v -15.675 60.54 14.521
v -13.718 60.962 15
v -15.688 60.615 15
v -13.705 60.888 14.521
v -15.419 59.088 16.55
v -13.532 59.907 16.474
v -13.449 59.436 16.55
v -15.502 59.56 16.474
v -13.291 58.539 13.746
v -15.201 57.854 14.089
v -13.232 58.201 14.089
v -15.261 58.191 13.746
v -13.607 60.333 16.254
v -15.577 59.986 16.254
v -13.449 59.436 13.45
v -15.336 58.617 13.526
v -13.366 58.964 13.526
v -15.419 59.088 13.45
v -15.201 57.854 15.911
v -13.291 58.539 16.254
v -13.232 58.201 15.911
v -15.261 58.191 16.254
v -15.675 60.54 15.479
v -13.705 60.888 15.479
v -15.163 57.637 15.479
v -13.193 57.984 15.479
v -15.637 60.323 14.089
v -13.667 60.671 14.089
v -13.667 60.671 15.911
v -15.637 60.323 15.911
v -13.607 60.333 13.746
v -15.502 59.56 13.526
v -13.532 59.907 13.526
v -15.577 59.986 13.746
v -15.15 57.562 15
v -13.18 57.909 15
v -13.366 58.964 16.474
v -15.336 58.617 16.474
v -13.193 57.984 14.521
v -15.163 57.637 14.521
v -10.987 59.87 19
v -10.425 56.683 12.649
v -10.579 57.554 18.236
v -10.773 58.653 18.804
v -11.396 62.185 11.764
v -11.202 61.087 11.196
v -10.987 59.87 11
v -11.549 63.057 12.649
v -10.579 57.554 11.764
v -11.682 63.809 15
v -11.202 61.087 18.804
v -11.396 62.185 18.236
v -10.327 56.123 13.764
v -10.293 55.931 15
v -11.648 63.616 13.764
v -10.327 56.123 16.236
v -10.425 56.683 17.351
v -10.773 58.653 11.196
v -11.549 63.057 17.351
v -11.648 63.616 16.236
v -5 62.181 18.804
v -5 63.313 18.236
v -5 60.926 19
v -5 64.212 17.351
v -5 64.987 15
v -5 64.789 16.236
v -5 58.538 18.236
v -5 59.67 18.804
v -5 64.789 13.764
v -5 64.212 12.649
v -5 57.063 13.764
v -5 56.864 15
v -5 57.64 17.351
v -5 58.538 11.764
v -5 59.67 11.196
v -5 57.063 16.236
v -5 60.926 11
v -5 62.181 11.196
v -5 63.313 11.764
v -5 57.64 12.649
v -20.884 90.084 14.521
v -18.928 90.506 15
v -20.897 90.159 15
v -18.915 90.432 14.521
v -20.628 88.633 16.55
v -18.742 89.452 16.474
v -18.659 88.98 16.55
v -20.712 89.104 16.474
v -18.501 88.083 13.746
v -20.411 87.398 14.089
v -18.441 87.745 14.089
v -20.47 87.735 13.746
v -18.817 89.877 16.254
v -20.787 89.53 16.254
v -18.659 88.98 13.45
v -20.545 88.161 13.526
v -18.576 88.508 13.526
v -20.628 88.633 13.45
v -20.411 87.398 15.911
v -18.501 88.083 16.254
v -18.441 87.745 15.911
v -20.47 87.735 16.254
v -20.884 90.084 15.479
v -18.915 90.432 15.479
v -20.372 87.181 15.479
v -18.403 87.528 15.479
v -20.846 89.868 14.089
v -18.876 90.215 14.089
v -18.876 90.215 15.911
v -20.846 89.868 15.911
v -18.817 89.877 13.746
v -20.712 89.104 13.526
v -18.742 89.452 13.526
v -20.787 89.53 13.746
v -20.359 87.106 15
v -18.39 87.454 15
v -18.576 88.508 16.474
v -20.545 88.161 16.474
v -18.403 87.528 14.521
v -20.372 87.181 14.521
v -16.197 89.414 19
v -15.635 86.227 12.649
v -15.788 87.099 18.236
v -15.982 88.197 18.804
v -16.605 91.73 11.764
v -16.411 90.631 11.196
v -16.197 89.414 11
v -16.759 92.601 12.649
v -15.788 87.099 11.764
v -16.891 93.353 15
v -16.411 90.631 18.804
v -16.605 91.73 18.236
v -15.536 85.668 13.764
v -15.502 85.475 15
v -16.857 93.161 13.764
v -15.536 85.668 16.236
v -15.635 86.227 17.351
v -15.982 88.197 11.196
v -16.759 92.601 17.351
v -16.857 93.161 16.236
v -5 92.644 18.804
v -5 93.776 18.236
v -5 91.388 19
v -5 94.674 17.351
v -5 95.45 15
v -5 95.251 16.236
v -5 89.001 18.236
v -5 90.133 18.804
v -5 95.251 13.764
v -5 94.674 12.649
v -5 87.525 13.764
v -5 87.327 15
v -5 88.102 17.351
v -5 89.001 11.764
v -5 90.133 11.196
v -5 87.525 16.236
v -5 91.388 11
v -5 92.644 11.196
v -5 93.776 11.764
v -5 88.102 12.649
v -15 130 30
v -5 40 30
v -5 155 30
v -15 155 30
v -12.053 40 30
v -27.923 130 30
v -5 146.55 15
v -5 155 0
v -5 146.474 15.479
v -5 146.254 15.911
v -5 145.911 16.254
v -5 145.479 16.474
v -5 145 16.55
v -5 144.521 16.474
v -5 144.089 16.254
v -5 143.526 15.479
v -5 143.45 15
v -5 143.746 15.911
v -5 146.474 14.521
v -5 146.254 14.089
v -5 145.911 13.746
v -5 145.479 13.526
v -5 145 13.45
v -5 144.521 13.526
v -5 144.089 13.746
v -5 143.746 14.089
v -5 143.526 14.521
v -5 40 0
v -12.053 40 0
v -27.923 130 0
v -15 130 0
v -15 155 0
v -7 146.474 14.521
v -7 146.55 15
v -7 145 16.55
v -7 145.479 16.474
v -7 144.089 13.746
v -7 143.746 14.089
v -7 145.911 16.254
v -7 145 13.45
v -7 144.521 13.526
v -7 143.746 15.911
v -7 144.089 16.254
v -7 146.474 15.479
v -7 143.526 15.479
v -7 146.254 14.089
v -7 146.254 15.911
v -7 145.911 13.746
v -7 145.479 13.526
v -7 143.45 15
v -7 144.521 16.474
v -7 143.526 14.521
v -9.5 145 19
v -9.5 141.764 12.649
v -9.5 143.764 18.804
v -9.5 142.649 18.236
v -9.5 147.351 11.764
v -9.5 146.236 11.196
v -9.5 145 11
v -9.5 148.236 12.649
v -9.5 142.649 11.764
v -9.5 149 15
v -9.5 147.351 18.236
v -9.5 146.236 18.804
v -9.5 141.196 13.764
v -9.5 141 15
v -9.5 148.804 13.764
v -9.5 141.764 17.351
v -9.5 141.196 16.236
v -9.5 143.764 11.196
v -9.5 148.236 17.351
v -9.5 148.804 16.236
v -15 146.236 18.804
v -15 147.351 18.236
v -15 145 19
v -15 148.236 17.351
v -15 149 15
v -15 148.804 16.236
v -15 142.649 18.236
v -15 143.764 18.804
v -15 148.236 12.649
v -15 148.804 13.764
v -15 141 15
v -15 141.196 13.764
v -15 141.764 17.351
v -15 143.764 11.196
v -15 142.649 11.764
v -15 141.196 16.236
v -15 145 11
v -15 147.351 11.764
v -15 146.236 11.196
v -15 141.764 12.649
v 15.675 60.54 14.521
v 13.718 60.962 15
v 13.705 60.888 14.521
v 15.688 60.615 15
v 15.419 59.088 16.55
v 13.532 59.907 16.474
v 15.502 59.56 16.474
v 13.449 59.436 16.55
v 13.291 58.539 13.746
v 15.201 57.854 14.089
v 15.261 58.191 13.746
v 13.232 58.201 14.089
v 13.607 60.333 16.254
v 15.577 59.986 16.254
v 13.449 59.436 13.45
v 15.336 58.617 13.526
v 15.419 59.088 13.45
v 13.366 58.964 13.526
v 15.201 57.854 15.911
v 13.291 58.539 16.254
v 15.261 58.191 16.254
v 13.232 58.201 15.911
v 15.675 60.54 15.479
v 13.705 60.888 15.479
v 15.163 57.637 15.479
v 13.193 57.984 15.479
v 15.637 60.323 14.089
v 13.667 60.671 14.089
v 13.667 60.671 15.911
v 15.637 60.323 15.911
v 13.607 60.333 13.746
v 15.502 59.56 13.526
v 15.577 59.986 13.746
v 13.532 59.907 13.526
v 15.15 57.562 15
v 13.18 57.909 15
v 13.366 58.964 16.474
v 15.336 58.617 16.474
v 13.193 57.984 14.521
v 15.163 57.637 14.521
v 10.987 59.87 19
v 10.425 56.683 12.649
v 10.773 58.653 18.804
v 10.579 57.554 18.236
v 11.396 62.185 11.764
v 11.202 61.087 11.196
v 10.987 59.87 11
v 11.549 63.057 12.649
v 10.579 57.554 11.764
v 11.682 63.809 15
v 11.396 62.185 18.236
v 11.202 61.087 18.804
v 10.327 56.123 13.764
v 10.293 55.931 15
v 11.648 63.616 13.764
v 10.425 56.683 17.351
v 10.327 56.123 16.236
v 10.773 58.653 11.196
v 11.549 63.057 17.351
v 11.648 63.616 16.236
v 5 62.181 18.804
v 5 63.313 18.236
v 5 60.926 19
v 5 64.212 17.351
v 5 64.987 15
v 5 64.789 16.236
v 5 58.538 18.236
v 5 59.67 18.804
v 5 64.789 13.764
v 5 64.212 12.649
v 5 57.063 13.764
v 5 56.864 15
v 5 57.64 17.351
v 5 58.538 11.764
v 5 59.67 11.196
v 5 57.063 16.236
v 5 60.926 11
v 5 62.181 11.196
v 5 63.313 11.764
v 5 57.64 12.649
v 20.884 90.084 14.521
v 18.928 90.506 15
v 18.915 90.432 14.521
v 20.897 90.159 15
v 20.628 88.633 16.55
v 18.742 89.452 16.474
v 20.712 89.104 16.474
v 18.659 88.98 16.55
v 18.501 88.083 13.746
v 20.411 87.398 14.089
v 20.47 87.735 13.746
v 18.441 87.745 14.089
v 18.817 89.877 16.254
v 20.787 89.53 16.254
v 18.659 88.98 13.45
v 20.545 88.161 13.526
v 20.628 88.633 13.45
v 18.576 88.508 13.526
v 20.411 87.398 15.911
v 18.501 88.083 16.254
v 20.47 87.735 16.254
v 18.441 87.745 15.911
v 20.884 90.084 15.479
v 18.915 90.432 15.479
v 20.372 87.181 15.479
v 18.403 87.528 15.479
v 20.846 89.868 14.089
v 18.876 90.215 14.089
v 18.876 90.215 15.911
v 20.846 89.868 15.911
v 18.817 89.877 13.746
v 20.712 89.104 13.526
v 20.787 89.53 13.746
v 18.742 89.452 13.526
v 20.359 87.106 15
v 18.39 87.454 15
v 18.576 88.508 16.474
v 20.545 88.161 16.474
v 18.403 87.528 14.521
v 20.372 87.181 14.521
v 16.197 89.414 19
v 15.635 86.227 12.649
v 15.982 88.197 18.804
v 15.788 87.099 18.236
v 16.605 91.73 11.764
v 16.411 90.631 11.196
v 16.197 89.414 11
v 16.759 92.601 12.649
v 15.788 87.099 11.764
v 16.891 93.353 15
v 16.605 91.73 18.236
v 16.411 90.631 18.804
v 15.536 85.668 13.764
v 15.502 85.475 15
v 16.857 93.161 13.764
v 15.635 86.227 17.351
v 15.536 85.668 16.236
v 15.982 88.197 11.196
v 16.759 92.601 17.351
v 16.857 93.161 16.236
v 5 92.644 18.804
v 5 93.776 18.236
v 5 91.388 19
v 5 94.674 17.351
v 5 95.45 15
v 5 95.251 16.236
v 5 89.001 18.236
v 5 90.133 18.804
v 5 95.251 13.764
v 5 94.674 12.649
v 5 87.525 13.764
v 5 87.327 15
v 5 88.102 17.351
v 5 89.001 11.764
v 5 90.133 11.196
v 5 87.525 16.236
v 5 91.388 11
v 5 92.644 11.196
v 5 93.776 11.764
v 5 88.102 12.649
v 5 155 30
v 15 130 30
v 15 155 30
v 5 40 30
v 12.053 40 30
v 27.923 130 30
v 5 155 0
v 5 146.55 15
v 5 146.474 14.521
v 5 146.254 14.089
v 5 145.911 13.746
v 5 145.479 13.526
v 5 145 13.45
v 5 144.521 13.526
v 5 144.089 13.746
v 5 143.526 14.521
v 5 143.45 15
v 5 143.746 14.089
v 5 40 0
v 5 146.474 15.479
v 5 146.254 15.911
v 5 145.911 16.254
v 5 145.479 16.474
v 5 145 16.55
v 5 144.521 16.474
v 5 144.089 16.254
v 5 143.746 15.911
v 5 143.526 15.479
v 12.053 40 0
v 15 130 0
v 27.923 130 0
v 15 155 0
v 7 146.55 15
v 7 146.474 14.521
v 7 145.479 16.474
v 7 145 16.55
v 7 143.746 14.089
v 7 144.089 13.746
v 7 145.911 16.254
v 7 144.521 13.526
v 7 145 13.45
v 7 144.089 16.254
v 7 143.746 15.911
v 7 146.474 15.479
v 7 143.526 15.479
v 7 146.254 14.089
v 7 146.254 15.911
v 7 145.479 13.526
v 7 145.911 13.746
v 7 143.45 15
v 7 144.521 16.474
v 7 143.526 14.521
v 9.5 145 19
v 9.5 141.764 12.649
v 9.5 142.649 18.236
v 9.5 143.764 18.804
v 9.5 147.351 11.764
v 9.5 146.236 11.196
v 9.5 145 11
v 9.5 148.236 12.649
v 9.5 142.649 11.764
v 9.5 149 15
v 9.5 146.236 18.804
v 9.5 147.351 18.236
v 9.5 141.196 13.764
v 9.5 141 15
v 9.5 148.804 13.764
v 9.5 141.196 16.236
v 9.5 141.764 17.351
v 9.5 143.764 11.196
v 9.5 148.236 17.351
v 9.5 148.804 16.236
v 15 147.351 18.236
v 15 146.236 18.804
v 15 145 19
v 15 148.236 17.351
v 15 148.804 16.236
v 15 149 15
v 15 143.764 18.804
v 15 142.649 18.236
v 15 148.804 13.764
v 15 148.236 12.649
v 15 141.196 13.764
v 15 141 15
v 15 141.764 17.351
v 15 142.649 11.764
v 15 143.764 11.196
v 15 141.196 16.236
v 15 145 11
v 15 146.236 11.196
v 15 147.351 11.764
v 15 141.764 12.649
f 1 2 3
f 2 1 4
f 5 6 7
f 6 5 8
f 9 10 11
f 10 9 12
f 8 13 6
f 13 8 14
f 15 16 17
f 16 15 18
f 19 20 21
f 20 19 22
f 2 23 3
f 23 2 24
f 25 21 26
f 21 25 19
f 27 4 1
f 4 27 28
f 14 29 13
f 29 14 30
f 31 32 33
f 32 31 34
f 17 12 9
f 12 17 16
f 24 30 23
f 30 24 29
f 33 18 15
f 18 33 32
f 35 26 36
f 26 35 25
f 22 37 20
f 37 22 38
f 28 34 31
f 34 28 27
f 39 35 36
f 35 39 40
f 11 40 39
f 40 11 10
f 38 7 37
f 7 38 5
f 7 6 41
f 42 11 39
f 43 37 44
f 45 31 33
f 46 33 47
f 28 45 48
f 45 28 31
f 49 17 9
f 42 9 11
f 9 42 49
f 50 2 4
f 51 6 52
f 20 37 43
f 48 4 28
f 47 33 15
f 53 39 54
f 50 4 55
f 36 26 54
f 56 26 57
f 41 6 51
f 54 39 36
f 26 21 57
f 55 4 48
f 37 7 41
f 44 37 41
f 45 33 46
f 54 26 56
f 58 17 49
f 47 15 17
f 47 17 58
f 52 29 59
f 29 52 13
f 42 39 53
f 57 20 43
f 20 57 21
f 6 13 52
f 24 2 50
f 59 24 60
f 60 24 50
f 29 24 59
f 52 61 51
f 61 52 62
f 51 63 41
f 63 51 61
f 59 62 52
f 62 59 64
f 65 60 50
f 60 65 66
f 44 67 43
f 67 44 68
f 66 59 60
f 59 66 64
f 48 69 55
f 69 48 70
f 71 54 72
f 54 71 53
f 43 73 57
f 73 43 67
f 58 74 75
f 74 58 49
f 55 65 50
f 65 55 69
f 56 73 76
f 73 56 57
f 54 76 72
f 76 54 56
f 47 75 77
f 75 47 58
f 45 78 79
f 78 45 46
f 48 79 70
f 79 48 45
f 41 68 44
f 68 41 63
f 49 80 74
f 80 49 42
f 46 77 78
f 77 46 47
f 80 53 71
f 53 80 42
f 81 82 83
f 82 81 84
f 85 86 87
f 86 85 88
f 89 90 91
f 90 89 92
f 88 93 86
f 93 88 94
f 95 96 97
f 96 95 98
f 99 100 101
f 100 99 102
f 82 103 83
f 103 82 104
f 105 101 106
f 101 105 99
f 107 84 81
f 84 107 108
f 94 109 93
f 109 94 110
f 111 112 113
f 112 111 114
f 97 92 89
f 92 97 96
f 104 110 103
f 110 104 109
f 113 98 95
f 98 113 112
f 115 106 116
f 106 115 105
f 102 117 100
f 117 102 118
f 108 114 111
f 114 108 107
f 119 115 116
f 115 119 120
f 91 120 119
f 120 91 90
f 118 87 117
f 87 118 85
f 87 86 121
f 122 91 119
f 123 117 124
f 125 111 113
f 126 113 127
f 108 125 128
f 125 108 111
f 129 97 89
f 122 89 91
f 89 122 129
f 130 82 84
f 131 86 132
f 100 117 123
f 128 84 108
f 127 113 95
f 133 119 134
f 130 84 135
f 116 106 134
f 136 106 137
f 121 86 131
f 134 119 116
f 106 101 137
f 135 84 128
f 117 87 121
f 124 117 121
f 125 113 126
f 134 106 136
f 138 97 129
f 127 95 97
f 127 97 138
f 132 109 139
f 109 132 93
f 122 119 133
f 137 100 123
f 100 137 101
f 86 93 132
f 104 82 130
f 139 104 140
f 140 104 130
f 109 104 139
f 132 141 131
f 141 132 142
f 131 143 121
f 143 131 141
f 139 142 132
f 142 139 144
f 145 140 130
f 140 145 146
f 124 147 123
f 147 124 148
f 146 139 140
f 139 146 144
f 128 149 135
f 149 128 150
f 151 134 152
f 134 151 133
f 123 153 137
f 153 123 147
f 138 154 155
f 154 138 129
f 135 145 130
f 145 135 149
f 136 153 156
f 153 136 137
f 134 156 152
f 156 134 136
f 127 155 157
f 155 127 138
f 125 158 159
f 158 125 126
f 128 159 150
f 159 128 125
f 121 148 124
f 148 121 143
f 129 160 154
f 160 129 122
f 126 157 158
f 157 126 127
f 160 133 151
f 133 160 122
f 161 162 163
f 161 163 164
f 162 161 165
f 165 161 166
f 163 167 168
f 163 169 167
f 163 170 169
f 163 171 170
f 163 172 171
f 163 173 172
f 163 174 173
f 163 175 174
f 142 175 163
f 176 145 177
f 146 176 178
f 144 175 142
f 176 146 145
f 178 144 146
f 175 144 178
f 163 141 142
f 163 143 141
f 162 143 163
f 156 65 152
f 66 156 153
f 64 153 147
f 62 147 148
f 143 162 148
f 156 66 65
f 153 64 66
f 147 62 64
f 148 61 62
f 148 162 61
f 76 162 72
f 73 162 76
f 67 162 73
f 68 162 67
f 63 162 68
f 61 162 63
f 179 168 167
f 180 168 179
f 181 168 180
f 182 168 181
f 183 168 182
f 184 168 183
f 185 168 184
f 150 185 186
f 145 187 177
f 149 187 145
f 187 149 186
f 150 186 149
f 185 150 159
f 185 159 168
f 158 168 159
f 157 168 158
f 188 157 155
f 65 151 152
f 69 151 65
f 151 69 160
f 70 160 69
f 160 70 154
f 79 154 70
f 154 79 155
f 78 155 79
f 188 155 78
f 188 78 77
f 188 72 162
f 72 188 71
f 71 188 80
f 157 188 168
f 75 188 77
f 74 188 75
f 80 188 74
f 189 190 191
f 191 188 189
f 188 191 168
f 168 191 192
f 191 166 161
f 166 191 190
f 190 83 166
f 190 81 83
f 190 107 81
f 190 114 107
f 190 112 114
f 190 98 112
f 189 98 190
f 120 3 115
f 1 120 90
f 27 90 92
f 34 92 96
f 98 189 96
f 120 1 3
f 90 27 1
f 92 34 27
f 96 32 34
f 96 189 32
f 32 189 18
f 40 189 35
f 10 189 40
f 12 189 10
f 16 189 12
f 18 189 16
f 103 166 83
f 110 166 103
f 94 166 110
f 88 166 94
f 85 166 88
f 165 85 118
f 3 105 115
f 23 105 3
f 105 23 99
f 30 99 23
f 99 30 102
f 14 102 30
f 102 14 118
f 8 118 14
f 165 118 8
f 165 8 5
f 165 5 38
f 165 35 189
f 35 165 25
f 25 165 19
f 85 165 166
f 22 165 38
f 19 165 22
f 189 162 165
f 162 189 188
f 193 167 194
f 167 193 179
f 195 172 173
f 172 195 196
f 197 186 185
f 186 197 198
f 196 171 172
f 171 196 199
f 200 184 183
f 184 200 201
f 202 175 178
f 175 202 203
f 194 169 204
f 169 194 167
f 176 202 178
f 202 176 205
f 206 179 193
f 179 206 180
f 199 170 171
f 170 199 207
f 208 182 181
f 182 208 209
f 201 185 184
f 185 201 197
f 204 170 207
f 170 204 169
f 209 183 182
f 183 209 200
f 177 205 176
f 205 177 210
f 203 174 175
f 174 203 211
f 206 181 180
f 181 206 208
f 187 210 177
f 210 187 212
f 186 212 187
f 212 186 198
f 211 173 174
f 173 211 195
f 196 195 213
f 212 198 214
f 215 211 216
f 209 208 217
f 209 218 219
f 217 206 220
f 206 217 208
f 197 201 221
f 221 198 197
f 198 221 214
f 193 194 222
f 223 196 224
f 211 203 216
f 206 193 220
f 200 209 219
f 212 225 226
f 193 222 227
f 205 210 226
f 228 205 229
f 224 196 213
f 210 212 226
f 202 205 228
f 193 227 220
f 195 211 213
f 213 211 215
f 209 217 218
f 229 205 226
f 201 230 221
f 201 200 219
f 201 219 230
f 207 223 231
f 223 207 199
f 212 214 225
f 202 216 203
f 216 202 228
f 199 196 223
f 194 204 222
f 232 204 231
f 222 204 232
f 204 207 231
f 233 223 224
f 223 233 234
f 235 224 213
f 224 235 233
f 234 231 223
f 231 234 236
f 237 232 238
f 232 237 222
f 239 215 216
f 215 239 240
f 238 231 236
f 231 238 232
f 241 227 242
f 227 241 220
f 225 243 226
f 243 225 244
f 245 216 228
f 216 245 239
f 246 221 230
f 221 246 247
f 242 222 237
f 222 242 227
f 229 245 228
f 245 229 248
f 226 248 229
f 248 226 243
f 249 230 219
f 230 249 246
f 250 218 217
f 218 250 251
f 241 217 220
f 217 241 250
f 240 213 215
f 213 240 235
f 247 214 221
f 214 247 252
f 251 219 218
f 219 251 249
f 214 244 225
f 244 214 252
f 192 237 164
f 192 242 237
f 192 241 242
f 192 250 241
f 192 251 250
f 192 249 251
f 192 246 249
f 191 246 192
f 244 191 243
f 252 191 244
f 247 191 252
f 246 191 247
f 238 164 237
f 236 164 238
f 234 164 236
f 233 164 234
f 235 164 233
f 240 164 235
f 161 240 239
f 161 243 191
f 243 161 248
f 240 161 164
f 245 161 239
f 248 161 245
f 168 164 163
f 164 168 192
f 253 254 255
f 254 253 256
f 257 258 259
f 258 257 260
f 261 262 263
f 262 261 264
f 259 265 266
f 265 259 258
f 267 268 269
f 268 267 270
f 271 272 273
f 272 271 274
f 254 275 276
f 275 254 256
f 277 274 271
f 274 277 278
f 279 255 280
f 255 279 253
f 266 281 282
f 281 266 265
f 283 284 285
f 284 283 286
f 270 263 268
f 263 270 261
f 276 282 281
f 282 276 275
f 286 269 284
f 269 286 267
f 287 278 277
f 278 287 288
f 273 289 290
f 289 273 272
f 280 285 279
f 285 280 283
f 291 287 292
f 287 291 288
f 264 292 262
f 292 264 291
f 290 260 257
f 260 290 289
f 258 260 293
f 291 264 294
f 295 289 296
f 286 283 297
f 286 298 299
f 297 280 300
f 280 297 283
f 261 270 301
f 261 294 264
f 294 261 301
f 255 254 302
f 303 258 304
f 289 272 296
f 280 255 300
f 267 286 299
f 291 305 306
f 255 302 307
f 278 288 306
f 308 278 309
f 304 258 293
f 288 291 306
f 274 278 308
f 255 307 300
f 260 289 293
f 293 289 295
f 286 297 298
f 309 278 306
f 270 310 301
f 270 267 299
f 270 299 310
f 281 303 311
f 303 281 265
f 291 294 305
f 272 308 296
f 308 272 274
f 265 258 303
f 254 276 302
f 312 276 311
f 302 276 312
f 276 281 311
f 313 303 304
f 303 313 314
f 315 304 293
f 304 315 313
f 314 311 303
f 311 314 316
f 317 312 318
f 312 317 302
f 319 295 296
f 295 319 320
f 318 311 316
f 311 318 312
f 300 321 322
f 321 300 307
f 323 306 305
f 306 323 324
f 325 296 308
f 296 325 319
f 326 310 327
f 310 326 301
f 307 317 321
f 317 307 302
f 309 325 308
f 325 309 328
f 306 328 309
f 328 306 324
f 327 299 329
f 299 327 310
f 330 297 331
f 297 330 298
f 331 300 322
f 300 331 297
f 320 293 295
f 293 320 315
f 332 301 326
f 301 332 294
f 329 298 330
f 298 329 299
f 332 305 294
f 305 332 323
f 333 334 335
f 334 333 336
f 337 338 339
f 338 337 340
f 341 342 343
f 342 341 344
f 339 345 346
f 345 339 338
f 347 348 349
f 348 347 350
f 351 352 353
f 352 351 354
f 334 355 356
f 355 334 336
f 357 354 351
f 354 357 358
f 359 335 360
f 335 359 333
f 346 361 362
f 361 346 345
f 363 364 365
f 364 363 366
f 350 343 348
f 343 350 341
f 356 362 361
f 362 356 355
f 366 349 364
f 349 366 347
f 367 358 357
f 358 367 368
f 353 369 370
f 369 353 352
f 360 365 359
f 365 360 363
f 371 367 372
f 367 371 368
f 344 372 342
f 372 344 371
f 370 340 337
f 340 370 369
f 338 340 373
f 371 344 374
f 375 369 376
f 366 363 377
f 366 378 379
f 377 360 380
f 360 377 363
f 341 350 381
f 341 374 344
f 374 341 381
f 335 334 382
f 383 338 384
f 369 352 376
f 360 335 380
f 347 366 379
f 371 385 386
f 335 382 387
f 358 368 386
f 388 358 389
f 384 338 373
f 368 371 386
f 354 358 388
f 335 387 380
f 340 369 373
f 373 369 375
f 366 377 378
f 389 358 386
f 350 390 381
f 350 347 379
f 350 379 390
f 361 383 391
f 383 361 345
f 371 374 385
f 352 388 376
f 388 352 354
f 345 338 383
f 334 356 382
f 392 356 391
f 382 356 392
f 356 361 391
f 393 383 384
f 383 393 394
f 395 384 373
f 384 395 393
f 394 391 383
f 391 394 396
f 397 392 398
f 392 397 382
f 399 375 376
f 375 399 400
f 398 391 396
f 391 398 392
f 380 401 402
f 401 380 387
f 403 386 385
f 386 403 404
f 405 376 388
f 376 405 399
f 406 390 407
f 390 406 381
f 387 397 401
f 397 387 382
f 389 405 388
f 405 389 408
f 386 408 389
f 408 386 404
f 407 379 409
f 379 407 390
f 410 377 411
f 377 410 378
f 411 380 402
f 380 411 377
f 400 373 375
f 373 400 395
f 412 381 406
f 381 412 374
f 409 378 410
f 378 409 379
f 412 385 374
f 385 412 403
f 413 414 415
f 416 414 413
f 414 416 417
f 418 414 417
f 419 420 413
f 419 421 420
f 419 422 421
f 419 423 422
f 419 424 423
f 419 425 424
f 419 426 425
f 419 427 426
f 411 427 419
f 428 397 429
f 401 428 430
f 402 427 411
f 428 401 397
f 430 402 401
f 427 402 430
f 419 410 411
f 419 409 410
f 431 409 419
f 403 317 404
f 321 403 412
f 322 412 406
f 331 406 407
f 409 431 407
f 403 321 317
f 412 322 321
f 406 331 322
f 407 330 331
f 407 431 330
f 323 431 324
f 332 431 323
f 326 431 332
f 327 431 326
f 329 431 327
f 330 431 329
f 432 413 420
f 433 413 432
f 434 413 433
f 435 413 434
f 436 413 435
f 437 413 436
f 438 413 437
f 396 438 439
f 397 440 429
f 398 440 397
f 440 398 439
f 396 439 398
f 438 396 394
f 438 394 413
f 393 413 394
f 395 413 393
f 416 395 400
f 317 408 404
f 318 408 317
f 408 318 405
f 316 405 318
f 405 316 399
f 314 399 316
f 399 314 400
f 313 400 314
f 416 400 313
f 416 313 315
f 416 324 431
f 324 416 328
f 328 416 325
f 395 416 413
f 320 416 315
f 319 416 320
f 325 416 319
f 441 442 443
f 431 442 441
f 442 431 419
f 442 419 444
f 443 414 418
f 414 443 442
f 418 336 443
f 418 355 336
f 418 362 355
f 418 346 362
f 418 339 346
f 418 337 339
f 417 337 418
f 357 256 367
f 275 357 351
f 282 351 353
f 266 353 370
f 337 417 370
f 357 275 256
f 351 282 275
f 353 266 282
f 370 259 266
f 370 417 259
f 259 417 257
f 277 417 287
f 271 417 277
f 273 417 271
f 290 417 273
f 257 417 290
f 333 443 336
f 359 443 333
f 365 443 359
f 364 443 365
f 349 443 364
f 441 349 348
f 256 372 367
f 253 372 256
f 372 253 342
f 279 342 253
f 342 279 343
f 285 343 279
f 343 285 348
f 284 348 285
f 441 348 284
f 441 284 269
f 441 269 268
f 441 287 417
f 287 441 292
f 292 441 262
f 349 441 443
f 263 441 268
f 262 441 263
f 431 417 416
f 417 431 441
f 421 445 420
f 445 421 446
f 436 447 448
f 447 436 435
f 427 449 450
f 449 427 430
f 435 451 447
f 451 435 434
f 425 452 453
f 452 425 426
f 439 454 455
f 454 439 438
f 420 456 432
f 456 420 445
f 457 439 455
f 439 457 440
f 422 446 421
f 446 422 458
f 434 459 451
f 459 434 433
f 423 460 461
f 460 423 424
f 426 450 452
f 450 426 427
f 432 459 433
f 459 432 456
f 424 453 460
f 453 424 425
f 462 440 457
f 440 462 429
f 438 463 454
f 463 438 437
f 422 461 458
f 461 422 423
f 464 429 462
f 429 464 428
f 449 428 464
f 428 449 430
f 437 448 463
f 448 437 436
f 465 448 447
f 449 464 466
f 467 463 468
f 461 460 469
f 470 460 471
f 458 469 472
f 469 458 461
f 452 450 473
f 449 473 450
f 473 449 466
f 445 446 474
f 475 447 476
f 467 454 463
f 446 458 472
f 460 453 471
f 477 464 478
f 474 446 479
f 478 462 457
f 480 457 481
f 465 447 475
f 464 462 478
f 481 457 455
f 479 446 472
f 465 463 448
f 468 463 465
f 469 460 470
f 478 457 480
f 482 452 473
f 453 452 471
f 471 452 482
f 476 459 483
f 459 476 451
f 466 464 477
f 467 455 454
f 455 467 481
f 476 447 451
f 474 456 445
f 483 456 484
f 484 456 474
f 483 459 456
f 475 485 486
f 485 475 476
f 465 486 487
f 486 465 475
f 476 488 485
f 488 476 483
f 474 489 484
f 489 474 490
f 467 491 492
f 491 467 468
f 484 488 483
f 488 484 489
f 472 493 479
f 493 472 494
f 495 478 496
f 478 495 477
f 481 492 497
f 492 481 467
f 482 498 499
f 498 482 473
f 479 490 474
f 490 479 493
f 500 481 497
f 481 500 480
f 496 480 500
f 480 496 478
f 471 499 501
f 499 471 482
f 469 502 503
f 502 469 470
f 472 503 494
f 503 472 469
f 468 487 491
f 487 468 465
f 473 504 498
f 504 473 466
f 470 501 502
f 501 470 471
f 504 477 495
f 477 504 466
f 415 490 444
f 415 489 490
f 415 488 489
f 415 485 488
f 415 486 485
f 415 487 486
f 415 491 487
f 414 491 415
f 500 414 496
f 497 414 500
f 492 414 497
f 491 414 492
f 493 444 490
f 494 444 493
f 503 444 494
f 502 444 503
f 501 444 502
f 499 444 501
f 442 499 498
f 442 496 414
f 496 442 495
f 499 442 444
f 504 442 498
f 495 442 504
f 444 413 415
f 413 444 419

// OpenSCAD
// file: params.scad
plate_size = [286.150000, 95.650000] ;
switch_info = [[[9.525, -9.525], 0, 1, 0], [[28.575000000000003, -9.525], 0, 1, 0], [[47.625, -9.525], 0, 1, 0], [[66.67500000000001, -9.525], 0, 1, 0], [[85.72500000000001, -9.525], 0, 1, 0], [[104.775, -9.525], 0, 1, 0], [[123.825, -9.525], 0, 1, 0], [[142.875, -9.525], 0, 1, 0], [[161.925, -9.525], 0, 1, 0], [[180.97500000000002, -9.525], 0, 1, 0], [[200.02500000000003, -9.525], 0, 1, 0], [[219.07500000000005, -9.525], 0, 1, 0], [[238.12500000000006, -9.525], 0, 1, 0], [[257.17500000000007, -9.525], 0, 1, 0], [[276.225, -9.525], 0, 1, 0], [[14.287500000000001, -28.575000000000003], 0, 1.5, 1], [[38.1, -28.575000000000003], 0, 1, 1], [[57.15, -28.575000000000003], 0, 1, 1], [[76.2, -28.575000000000003], 0, 1, 1], [[95.25, -28.575000000000003], 0, 1, 1], [[114.3, -28.575000000000003], 0, 1, 1], [[133.35, -28.575000000000003], 0, 1, 1], [[152.4, -28.575000000000003], 0, 1, 1], [[171.45000000000002, -28.575000000000003], 0, 1, 1], [[190.50000000000003, -28.575000000000003], 0, 1, 1], [[209.55000000000004, -28.575000000000003], 0, 1, 1], [[228.60000000000005, -28.575000000000003], 0, 1, 1], [[247.65000000000006, -28.575000000000003], 0, 1, 1], [[271.4625000000001, -28.575000000000003], 0, 1.5, 1], [[16.66875, -47.625], 0, 1.75, 2], [[42.8625, -47.625], 0, 1, 2], [[61.9125, -47.625], 0, 1, 2], [[80.9625, -47.625], 0, 1, 2], [[100.0125, -47.625], 0, 1, 2], [[119.0625, -47.625], 0, 1, 2], [[138.1125, -47.625], 0, 1, 2], [[157.16250000000002, -47.625], 0, 1, 2], [[176.21250000000003, -47.625], 0, 1, 2], [[195.26250000000005, -47.625], 0, 1, 2], [[214.31250000000006, -47.625], 0, 1, 2], [[233.36250000000007, -47.625], 0, 1, 2], [[264.3187500000001, -47.625], 0, 2.25, 2], [[21.431250000000002, -66.67500000000001], 0, 2.25, 3], [[52.3875, -66.67500000000001], 0, 1, 3], [[71.43750000000001, -66.67500000000001], 0, 1, 3], [[90.48750000000001, -66.67500000000001], 0, 1, 3], [[109.53750000000001, -66.67500000000001], 0, 1, 3], [[128.5875, -66.67500000000001], 0, 1, 3], [[147.63750000000002, -66.67500000000001], 0, 1, 3], [[166.68750000000003, -66.67500000000001], 0, 1, 3], [[185.73750000000004, -66.67500000000001], 0, 1, 3], [[204.78750000000005, -66.67500000000001], 0, 1, 3], [[223.83750000000006, -66.67500000000001], 0, 1, 3], [[250.03125000000006, -66.67500000000001], 0, 1.75, 3], [[276.225, -66.67500000000001], 0, 1, 3], [[38.1, -85.72500000000001], 0, 1, 4], [[61.9125, -85.72500000000001], 0, 1.5, 4], [[133.35000000000002, -85.72500000000001], 0, 6, 4], [[204.7875, -85.72500000000001], 0, 1.5, 4], [[228.6, -85.72500000000001], 0, 1, 4]] ;
// file: common.scad
include <params.scad>

inch = 25.4;
unit = 19.05;
x = [1, 0, 0];
y = [0, 1, 0];
z = [0, 0, 1];

// margin as 2D vector, to be added outside of the keyboard 
margin = [3, 2];

// tilt angle of the keyboard in degree unit
tilt = 10;

// ront_height height of the keyboard at front side. overall height will be
// calculated based on front_height and tilt_angle. make sure that there is
// enough room for PCB to be placed under the keyboard.
front_height = 14;

// roundnessness radius at side
roundness = 10;

// size of material to carve
block_size = [330, 130, 34];

// roundness of top of case
R = 400;

// maximum distance from top of your keyboard to switch mount surface.
lip_depth = 7.5;

// following are calcualted parameters
mx = margin[0];
my = margin[1];
px = plate_size[0];
py = plate_size[1];

h1 = front_height;
h2 = h1 + py*sin(tilt);
w = py*cos(tilt);

p = sq(h2-h1)/sq(w);
q = (sq(w)+sq(h2)-sq(h1))/(2*(h2-h1));
r = p+1;
s = -2*(p*q+h1);
t = p*sq(q)+sq(h1)-sq(R);
b = (-s+sqrt(sq(s)-4*r*t))/(2*r);
a = -sqrt(sq(R)-sq(h1-b));

o0 = 6;
o2 = 4;

function sq(x) = pow(x, 2);
function t1(x) = b - sqrt(sq(R) - sq(x-a))-roundness;
function t0(x) =
    let(b = my)
    let(a = d1(0) / (o0*pow(-b, o0-1)))
    let(c = t1(0) - a*pow(-b, o0))
    a*pow(x-b, o0)+c;
function t2(x) = 
    let(b = w+my)
    let(a = d1(w) / (o2*pow(w-b, o2-1)))
    let(c = t1(w) - a*pow(w-b, o2))
    a*pow(x-b, o2)+c;
function d1(x) = (x-a) / sqrt(sq(R) - sq(x-a));
function d0(x) = 
    let(b = my)
    let(a = d1(0) / (o0*pow(-b, o0-1)))
    let(c = t1(0) - a*pow(-b, o0))
    o0*a*pow(x-b, o0-1);
function d2(x) = 
    let(b = w+my)
    let(a = d1(w) / (o2*pow(w-b, o2-1)))
    let(c = t1(w) - a*pow(w-b, o2))
    o2*a*pow(x-b,o2-1);
function traj(x) =
    x <= 0 ? t0(x) :
    x <= w ? t1(x) : t2(x);
function devi(x) = 
    x <= 0 ? d0(x) :
    x <= w ? d1(x) : d2(x);
function ymin() = 
    let(b = my)
    let(a = d1(0) / (o0*pow(-b, o0-1)))
    let(c = t1(0) - a*pow(-b, o0))
    -abs(pow(-c/a, 1/o0))+b-roundness;
function ymax() =
    let(b = w+my)
    let(a = d1(w) / (o2*pow(w-b, o2-1)))
    let(c = t1(w) - a*pow(w-b, o2))
    abs(pow(-c/a, 1/o2))+b+roundness;
function xmin() = -mx-roundness;
function xmax() = px+mx+roundness;
function base_size() = [xmax()-xmin(), ymax()-ymin(), block_size[2]];
function block_height() = block_size[2];
function tilted_height() = front_height + (ymax()-ymin())*sin(tilt);

echo("tilted_height:", tilted_height());

half_circle = [for (i = [0 : 180/12 : 180]) [cos(i), sin(i)]];

module invert_2D()
{
    difference() {
        translate([xmin(), ymin()]) square([block_size[0], block_size[1]]);
        children();
    }
}

module mirrored(d) {
    children();
    mirror(d) children();
}
// main file
include <common.scad>

module tilt_holder()
{
    difference()
    {
        cube([30, 130, 34]);
        rotate(tilt*x) cube([30, 200, 40]);
        cube([30, 40, 40]);

        rotate(tilt*x) translate([15, 60])  mirror(z) screw_hole();
        rotate(tilt*x) translate([15, 90])  mirror(z) screw_hole();
    }

    translate(130*y)
    difference()
    {
        cube([30, 25, 10]);
        translate([15, 15]) screw_hole();
    }

    module screw_hole()
    {
        translate(2*z) {
            mirror(z) translate(-0.1*z) cylinder(d=3.1, h=20, $fn=20);
            cylinder(d1=3.1, d2=8, h=2.5, $fn=20);
            translate(2.5*z) cylinder(d=8, h=20, $fn=20);
        }
    }
}

mirrored(x)
translate(-5*x)
rotate(-y*90)
tilt_holder();
